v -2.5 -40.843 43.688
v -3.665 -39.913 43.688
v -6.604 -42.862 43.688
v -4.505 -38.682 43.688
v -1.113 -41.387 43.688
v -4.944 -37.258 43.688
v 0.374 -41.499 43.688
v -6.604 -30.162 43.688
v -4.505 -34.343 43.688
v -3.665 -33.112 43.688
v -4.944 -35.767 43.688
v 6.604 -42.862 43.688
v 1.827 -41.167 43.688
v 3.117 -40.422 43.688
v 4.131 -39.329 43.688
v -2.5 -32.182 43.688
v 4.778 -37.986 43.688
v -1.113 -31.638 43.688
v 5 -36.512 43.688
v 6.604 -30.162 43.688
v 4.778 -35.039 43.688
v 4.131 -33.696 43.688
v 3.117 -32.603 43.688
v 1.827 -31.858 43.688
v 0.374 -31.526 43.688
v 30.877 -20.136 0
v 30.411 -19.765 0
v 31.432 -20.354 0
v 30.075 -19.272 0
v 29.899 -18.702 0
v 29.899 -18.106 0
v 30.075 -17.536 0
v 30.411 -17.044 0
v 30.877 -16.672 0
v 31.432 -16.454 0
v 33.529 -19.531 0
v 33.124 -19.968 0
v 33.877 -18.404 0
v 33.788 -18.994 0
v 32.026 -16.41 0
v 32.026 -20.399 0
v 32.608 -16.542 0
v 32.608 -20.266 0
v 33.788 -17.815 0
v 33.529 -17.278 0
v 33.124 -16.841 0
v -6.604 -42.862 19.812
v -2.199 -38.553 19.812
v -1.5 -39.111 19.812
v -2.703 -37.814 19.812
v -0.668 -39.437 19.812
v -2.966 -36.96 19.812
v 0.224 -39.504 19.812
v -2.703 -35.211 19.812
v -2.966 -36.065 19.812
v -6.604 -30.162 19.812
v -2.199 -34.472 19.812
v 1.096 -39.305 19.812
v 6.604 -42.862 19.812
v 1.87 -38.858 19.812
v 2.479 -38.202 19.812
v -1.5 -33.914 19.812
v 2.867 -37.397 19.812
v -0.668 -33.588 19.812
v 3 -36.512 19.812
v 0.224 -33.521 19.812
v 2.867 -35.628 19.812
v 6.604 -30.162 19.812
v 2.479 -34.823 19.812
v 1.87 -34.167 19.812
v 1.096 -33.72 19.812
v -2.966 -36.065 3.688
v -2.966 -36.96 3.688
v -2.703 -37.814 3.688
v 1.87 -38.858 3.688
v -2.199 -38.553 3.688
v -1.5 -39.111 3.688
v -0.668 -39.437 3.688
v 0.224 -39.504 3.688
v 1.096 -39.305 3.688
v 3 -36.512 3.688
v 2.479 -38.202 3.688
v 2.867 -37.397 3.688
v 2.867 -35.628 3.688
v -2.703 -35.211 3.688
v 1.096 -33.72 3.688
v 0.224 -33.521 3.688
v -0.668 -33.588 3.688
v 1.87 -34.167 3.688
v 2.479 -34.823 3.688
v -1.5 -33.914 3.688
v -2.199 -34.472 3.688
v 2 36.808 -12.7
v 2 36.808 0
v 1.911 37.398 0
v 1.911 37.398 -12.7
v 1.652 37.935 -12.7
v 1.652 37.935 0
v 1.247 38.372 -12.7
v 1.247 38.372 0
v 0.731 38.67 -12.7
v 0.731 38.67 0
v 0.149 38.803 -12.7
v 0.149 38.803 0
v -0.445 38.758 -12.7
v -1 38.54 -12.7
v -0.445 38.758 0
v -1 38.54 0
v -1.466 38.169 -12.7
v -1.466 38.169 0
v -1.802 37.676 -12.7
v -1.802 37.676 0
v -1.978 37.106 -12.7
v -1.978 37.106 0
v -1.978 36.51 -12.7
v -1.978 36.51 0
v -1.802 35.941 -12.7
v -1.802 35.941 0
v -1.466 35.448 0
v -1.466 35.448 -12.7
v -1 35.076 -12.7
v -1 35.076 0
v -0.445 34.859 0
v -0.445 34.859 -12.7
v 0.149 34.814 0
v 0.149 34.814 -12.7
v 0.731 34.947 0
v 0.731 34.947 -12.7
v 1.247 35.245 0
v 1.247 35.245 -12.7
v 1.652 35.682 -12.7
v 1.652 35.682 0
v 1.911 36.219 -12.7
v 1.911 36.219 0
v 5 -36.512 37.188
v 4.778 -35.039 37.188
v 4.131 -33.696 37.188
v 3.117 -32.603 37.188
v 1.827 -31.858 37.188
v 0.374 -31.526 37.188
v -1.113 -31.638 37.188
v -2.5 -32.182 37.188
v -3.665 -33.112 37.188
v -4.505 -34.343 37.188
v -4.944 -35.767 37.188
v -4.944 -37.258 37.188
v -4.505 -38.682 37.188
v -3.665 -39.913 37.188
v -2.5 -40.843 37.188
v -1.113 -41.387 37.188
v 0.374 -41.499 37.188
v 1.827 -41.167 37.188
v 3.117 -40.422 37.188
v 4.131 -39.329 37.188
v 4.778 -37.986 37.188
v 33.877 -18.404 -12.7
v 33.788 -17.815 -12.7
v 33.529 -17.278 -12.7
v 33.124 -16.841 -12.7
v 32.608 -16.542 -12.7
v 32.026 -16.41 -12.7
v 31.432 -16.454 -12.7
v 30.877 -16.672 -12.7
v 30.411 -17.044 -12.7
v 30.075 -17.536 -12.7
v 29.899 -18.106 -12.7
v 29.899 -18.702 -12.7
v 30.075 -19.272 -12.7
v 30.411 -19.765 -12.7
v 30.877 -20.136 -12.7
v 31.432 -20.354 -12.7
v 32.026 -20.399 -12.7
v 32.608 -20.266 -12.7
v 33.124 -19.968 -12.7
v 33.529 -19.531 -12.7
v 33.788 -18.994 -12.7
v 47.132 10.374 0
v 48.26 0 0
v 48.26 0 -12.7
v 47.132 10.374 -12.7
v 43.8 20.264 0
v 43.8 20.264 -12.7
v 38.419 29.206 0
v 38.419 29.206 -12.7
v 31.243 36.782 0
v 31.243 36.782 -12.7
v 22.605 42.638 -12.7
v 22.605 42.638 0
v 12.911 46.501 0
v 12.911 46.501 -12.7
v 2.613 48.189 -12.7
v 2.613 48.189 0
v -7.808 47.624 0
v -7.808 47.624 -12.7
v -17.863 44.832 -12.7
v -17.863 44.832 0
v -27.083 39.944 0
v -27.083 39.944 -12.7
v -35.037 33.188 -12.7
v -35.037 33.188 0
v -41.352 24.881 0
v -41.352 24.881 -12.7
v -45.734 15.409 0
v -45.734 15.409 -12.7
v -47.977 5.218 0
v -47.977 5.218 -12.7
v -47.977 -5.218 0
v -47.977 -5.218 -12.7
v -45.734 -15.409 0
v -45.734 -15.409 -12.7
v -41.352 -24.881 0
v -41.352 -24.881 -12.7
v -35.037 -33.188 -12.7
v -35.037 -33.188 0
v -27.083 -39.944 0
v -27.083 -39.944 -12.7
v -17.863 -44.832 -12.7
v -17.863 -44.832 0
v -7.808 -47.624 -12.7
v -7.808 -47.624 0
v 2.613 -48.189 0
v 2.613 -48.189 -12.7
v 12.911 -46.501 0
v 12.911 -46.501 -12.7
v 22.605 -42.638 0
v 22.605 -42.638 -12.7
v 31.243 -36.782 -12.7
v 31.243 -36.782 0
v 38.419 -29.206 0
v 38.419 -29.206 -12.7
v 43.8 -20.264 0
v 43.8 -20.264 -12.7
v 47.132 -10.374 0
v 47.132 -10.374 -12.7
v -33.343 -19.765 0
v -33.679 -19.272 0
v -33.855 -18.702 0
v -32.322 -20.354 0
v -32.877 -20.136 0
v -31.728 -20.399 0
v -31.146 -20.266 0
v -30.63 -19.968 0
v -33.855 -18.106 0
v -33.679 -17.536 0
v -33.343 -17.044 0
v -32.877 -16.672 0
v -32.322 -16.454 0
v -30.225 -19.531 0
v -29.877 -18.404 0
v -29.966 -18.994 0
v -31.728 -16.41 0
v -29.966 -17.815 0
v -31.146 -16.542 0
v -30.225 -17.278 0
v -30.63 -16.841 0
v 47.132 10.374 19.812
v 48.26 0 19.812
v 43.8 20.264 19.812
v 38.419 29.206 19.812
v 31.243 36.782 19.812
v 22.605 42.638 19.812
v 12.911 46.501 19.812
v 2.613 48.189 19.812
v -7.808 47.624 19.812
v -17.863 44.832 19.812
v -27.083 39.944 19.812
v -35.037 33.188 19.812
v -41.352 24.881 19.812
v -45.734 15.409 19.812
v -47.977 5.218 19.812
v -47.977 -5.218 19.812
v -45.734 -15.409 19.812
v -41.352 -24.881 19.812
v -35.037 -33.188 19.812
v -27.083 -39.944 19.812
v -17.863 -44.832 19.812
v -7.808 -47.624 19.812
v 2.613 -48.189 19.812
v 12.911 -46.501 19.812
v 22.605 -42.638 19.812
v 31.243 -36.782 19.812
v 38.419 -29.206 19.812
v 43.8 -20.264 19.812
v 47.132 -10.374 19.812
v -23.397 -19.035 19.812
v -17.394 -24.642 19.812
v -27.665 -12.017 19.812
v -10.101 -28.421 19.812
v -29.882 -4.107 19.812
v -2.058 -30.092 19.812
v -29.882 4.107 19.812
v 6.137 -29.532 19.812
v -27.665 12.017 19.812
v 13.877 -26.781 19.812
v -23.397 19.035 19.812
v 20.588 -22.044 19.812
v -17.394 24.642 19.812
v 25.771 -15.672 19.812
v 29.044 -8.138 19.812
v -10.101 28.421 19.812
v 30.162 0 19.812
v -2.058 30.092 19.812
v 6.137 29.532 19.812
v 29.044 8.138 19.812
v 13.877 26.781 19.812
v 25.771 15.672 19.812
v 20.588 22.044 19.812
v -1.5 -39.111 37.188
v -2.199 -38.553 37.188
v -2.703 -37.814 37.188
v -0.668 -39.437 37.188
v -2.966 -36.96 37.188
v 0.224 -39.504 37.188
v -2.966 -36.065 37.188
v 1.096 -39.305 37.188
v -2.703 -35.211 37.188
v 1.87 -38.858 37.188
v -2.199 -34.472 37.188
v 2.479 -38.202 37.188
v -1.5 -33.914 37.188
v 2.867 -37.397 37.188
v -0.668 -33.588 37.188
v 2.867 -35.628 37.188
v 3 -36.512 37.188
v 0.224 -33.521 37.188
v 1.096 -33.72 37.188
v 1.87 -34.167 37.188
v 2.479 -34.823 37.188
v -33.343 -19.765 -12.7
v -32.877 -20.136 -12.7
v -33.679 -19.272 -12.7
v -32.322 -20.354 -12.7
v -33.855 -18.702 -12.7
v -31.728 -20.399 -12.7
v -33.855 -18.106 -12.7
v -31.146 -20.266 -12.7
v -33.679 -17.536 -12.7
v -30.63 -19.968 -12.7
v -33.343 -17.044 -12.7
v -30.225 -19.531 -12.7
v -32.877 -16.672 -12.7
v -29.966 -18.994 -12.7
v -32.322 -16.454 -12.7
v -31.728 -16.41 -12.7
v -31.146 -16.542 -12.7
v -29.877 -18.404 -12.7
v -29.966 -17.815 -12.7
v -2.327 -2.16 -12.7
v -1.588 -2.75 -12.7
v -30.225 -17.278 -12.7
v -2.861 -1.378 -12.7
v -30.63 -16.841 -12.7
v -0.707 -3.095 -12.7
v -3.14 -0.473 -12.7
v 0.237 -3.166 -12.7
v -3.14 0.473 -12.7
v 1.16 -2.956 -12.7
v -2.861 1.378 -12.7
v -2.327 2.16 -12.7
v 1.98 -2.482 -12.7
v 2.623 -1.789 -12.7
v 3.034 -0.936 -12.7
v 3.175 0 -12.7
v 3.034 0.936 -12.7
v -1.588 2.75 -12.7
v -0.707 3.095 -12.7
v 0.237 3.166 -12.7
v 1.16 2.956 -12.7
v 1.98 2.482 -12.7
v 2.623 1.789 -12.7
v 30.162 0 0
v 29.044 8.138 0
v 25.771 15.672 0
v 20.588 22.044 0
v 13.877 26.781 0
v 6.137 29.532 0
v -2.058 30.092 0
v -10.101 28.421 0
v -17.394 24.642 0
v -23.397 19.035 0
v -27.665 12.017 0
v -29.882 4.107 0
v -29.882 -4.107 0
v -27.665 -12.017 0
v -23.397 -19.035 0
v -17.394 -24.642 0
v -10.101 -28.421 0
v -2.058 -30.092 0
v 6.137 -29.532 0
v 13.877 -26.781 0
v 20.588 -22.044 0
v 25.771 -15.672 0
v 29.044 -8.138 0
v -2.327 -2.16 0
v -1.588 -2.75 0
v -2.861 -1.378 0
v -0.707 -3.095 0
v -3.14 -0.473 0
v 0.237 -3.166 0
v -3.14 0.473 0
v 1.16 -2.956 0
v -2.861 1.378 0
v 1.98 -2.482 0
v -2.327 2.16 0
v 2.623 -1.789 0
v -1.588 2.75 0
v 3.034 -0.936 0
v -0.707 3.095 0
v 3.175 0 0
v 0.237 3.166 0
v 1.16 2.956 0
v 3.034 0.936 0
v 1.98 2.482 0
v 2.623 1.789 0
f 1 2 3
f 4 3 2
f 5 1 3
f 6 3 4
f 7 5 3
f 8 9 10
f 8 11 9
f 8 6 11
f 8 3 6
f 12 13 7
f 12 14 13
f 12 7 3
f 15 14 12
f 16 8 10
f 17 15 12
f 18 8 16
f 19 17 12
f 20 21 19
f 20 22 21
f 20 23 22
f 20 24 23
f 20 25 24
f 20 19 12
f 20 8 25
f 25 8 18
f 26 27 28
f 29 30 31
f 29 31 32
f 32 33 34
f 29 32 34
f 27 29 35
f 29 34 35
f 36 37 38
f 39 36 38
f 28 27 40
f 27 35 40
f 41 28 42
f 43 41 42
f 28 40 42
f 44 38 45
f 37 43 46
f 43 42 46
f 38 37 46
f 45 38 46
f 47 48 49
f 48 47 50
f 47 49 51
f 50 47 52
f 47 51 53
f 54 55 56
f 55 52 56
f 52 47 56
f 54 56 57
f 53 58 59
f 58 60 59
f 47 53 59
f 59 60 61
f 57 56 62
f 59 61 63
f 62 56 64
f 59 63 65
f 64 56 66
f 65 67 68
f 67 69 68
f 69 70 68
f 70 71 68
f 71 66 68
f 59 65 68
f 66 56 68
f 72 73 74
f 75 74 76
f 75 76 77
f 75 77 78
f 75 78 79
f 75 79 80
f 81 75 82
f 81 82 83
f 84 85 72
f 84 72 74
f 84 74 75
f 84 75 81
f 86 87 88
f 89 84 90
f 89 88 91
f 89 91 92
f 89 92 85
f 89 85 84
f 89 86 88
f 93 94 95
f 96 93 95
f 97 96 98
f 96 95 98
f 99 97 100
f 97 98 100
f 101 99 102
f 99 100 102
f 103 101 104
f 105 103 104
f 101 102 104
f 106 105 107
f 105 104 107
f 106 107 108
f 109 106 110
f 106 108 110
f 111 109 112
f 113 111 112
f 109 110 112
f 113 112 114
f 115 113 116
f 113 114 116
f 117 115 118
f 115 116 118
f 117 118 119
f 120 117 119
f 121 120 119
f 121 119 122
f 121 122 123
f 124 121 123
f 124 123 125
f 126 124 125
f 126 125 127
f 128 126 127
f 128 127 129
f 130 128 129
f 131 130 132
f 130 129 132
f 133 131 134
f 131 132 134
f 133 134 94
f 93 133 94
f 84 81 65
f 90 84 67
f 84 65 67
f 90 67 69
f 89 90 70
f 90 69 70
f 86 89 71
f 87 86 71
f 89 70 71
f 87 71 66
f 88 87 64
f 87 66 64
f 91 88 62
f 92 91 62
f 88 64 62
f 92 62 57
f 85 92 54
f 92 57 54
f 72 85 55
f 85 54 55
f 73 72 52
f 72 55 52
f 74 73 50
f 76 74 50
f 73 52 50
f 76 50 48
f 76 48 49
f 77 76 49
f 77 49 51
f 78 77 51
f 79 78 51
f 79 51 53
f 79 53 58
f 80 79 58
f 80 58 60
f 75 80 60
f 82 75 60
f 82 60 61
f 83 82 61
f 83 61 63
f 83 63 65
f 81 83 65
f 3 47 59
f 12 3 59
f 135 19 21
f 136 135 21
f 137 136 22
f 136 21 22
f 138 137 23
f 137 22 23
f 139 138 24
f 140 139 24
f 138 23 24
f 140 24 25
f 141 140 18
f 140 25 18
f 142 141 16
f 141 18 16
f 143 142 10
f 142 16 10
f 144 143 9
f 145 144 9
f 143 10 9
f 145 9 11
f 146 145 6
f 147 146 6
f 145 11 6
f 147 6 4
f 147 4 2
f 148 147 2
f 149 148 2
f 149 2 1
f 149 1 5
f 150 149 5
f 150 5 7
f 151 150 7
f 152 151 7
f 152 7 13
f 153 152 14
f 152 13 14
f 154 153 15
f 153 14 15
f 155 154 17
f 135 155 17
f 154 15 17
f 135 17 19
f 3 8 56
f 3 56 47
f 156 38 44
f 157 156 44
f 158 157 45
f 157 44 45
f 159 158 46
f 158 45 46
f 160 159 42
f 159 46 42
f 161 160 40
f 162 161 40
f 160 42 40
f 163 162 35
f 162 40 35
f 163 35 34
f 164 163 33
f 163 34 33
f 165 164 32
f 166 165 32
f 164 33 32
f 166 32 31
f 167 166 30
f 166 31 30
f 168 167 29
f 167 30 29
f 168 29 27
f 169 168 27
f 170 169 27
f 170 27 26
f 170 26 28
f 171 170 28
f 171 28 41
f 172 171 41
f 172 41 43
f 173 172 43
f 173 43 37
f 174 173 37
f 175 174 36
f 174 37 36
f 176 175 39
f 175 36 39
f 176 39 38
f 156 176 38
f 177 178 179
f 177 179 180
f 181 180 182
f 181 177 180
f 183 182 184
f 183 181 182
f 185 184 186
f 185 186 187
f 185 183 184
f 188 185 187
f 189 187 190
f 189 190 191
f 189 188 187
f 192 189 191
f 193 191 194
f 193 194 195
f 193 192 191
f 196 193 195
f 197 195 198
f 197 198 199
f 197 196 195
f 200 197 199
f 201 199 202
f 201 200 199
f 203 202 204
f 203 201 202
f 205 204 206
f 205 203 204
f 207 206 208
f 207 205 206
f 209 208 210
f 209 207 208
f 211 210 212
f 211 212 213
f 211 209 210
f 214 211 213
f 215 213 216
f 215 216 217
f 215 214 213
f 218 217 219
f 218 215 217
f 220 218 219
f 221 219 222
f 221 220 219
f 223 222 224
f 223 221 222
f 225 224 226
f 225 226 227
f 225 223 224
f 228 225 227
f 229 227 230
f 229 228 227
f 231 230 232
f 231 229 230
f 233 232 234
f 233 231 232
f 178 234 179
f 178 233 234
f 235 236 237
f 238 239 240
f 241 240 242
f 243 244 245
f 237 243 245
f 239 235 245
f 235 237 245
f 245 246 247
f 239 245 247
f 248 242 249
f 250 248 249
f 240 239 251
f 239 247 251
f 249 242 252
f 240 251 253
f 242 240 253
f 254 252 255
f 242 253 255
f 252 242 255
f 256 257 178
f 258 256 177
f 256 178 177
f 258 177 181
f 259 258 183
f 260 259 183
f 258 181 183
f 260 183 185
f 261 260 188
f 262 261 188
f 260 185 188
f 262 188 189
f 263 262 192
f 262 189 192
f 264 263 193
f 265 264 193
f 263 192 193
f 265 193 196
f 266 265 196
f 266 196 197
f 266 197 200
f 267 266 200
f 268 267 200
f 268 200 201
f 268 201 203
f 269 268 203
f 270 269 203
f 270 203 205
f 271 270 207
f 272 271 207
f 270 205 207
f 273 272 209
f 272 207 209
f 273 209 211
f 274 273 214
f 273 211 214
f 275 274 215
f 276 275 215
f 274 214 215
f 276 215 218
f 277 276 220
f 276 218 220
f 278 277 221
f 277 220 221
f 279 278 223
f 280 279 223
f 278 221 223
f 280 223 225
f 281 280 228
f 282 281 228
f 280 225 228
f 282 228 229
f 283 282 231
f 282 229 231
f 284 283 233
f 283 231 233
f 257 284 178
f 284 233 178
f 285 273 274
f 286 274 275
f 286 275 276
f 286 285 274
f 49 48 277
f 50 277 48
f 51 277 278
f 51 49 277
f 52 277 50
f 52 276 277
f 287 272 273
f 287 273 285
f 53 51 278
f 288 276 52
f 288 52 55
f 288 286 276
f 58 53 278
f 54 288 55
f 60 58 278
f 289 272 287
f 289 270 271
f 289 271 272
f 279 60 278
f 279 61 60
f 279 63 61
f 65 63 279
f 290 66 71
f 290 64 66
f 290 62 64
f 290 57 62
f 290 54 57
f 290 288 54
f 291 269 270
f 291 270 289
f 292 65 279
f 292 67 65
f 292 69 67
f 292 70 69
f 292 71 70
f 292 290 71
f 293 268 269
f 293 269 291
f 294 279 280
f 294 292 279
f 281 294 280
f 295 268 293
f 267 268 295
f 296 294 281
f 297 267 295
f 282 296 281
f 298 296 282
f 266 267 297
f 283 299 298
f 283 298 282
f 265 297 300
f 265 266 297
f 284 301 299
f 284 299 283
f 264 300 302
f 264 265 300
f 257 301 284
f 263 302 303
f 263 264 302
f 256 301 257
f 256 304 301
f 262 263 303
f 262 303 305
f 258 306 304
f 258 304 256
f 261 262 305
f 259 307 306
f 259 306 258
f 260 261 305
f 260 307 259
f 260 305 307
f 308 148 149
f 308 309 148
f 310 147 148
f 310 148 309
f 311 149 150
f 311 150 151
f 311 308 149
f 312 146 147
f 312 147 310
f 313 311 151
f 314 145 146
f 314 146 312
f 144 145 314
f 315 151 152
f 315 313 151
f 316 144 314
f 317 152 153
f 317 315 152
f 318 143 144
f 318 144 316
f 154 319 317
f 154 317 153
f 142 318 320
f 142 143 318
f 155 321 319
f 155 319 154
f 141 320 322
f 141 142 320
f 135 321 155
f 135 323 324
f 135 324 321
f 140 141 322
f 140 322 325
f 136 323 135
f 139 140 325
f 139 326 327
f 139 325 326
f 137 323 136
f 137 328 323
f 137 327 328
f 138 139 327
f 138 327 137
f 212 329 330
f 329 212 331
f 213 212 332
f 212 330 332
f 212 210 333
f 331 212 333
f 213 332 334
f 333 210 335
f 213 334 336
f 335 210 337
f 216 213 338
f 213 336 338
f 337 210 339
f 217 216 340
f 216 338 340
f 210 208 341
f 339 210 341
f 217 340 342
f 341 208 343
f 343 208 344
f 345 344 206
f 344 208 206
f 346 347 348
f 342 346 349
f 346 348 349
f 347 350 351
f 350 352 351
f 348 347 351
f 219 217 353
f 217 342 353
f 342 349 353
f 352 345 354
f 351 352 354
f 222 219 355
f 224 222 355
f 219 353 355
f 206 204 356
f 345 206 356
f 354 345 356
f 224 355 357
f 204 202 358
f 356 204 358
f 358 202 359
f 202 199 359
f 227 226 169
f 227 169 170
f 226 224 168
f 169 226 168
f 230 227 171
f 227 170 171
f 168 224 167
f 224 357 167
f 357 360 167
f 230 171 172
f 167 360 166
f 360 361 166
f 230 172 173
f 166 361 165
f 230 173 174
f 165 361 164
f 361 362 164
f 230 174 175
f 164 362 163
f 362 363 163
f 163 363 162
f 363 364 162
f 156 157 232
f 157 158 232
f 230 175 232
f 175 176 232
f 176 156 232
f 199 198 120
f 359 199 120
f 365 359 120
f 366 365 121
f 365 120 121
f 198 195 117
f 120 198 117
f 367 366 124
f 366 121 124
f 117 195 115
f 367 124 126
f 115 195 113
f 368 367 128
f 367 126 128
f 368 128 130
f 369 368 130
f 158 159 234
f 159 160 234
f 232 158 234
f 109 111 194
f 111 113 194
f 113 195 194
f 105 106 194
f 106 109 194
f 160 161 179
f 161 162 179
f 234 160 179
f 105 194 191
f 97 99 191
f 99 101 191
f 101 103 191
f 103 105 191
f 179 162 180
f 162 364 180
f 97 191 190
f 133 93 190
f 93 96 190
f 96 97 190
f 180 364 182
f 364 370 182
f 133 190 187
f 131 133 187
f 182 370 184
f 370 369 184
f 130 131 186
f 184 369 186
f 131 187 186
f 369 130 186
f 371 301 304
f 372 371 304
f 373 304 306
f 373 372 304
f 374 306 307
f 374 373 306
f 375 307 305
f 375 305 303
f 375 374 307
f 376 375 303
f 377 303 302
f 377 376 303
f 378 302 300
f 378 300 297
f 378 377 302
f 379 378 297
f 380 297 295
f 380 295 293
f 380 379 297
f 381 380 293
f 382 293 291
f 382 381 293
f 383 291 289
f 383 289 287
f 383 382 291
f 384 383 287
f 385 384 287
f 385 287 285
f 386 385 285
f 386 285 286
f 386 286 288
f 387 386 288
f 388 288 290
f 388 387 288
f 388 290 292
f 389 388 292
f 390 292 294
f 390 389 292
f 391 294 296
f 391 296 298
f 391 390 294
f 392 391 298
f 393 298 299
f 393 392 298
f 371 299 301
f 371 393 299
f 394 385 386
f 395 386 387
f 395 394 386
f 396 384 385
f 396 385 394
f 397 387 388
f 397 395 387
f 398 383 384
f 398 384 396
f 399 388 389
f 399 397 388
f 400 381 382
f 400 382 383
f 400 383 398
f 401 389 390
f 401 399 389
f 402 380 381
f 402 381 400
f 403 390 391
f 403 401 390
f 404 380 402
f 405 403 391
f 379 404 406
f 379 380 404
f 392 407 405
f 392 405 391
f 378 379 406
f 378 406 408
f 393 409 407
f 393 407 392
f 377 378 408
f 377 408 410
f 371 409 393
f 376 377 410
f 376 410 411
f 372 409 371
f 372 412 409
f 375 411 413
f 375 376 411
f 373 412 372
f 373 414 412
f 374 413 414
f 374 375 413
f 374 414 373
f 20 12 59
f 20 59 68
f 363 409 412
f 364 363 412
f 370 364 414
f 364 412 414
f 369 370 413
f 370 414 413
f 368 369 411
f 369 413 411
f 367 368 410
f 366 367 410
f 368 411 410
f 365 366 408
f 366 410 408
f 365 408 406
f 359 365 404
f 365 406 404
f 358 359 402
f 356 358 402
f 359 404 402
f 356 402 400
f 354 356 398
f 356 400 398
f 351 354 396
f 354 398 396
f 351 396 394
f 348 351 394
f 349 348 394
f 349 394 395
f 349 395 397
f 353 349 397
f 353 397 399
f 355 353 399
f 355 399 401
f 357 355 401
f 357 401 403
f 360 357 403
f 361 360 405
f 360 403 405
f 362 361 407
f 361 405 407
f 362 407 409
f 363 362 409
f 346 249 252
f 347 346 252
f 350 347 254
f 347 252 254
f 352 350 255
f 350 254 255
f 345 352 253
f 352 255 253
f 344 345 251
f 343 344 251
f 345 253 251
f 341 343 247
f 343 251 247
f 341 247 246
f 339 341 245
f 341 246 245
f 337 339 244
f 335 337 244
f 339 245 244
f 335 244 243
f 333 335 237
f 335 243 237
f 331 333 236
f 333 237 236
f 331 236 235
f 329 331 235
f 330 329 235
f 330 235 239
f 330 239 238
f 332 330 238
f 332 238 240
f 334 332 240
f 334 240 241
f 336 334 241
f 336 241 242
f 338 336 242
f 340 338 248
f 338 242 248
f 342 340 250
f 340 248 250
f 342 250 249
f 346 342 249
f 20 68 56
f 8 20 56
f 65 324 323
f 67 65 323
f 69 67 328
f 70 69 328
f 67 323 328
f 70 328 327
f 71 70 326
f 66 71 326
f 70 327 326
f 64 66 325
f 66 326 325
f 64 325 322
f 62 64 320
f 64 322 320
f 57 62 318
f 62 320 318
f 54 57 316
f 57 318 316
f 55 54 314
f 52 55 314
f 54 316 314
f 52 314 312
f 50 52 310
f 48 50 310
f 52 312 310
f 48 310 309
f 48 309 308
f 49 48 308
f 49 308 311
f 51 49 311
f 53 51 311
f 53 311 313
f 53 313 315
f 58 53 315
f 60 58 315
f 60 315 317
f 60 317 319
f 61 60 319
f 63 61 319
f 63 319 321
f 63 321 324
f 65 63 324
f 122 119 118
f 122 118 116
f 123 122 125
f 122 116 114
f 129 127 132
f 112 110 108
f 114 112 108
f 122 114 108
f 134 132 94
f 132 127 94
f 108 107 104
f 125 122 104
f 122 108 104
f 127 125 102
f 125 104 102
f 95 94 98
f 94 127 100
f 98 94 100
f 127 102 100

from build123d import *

# Parameters (mm, degrees)
F0_R     = 48.26
F0_R_2   = 2
F0_R_3   = 30.1625
F0_R_4   = 3.175
F1_DEPTH = 12.7
F2_DEPTH = 19.812
F4_DEPTH = 23.876
F5_R     = 5
F5_R_2   = 3
F6_DEPTH = 6.5
F7_DEPTH = 40


with BuildPart() as f1:
    # F0 (on Top) → F1 (new body)
    with BuildSketch(Plane.XY):
        Circle(F0_R)
        with Locations((-31.877, -18.404195)):
            Circle(F0_R_2, mode=Mode.SUBTRACT)
        with Locations((31.877, -18.404195)):
            Circle(F0_R_2, mode=Mode.SUBTRACT)
        Circle(F0_R_3, mode=Mode.SUBTRACT)
        with Locations((0, 36.808389)):
            Circle(F0_R_2, mode=Mode.SUBTRACT)
        Circle(F0_R_3)
        Circle(F0_R_4, mode=Mode.SUBTRACT)
    extrude(amount=-F1_DEPTH)

    # F0 (on Top) → F2 (join)
    with BuildSketch(Plane.XY):
        Circle(F0_R)
        with Locations((-31.877, -18.404195)):
            Circle(F0_R_2, mode=Mode.SUBTRACT)
        with Locations((31.877, -18.404195)):
            Circle(F0_R_2, mode=Mode.SUBTRACT)
        Circle(F0_R_3, mode=Mode.SUBTRACT)
        with Locations((0, 36.808389)):
            Circle(F0_R_2, mode=Mode.SUBTRACT)
        with Locations((0, 36.808389)):
            Circle(F0_R_2)
        with Locations((-31.877, -18.404195)):
            Circle(F0_R_2)
        with Locations((31.877, -18.404195)):
            Circle(F0_R_2)
    extrude(amount=F2_DEPTH)


with BuildPart() as f4:
    # F3 (on face) → F4 (new body)
    with BuildSketch(Plane.XY.offset(19.812)):
        Polygon((0, -30.1625), (-6.604, -30.1625), (-6.604, -42.8625), (6.604, -42.8625), (6.604, -30.1625), align=None)
    extrude(amount=F4_DEPTH)

    # F5 (on face) → F6 (cut)
    with BuildSketch(Plane.XY.offset(43.688)):
        with Locations((0, -36.5125)):
            Circle(F5_R)
        with Locations((0, -36.5125)):
            Circle(F5_R_2, mode=Mode.SUBTRACT)
        with Locations((0, -36.5125)):
            Circle(F5_R_2)
    extrude(amount=-F6_DEPTH, mode=Mode.SUBTRACT)


with BuildPart() as f7_tool:
    # F5 (on face) → F7 (new body)
    with BuildSketch(Plane.XY.offset(43.688)):
        with Locations((0, -36.5125)):
            Circle(F5_R_2)
    extrude(amount=-F7_DEPTH)


with BuildPart() as f1_1:
    add(f1.part)

    # F7: cut by f7_tool
    add(f7_tool.part, mode=Mode.SUBTRACT)


with BuildPart() as f4_1:
    add(f4.part)

    # F7: cut by f7_tool
    add(f7_tool.part, mode=Mode.SUBTRACT)


solid = Compound([f1_1.part, f4_1.part])
